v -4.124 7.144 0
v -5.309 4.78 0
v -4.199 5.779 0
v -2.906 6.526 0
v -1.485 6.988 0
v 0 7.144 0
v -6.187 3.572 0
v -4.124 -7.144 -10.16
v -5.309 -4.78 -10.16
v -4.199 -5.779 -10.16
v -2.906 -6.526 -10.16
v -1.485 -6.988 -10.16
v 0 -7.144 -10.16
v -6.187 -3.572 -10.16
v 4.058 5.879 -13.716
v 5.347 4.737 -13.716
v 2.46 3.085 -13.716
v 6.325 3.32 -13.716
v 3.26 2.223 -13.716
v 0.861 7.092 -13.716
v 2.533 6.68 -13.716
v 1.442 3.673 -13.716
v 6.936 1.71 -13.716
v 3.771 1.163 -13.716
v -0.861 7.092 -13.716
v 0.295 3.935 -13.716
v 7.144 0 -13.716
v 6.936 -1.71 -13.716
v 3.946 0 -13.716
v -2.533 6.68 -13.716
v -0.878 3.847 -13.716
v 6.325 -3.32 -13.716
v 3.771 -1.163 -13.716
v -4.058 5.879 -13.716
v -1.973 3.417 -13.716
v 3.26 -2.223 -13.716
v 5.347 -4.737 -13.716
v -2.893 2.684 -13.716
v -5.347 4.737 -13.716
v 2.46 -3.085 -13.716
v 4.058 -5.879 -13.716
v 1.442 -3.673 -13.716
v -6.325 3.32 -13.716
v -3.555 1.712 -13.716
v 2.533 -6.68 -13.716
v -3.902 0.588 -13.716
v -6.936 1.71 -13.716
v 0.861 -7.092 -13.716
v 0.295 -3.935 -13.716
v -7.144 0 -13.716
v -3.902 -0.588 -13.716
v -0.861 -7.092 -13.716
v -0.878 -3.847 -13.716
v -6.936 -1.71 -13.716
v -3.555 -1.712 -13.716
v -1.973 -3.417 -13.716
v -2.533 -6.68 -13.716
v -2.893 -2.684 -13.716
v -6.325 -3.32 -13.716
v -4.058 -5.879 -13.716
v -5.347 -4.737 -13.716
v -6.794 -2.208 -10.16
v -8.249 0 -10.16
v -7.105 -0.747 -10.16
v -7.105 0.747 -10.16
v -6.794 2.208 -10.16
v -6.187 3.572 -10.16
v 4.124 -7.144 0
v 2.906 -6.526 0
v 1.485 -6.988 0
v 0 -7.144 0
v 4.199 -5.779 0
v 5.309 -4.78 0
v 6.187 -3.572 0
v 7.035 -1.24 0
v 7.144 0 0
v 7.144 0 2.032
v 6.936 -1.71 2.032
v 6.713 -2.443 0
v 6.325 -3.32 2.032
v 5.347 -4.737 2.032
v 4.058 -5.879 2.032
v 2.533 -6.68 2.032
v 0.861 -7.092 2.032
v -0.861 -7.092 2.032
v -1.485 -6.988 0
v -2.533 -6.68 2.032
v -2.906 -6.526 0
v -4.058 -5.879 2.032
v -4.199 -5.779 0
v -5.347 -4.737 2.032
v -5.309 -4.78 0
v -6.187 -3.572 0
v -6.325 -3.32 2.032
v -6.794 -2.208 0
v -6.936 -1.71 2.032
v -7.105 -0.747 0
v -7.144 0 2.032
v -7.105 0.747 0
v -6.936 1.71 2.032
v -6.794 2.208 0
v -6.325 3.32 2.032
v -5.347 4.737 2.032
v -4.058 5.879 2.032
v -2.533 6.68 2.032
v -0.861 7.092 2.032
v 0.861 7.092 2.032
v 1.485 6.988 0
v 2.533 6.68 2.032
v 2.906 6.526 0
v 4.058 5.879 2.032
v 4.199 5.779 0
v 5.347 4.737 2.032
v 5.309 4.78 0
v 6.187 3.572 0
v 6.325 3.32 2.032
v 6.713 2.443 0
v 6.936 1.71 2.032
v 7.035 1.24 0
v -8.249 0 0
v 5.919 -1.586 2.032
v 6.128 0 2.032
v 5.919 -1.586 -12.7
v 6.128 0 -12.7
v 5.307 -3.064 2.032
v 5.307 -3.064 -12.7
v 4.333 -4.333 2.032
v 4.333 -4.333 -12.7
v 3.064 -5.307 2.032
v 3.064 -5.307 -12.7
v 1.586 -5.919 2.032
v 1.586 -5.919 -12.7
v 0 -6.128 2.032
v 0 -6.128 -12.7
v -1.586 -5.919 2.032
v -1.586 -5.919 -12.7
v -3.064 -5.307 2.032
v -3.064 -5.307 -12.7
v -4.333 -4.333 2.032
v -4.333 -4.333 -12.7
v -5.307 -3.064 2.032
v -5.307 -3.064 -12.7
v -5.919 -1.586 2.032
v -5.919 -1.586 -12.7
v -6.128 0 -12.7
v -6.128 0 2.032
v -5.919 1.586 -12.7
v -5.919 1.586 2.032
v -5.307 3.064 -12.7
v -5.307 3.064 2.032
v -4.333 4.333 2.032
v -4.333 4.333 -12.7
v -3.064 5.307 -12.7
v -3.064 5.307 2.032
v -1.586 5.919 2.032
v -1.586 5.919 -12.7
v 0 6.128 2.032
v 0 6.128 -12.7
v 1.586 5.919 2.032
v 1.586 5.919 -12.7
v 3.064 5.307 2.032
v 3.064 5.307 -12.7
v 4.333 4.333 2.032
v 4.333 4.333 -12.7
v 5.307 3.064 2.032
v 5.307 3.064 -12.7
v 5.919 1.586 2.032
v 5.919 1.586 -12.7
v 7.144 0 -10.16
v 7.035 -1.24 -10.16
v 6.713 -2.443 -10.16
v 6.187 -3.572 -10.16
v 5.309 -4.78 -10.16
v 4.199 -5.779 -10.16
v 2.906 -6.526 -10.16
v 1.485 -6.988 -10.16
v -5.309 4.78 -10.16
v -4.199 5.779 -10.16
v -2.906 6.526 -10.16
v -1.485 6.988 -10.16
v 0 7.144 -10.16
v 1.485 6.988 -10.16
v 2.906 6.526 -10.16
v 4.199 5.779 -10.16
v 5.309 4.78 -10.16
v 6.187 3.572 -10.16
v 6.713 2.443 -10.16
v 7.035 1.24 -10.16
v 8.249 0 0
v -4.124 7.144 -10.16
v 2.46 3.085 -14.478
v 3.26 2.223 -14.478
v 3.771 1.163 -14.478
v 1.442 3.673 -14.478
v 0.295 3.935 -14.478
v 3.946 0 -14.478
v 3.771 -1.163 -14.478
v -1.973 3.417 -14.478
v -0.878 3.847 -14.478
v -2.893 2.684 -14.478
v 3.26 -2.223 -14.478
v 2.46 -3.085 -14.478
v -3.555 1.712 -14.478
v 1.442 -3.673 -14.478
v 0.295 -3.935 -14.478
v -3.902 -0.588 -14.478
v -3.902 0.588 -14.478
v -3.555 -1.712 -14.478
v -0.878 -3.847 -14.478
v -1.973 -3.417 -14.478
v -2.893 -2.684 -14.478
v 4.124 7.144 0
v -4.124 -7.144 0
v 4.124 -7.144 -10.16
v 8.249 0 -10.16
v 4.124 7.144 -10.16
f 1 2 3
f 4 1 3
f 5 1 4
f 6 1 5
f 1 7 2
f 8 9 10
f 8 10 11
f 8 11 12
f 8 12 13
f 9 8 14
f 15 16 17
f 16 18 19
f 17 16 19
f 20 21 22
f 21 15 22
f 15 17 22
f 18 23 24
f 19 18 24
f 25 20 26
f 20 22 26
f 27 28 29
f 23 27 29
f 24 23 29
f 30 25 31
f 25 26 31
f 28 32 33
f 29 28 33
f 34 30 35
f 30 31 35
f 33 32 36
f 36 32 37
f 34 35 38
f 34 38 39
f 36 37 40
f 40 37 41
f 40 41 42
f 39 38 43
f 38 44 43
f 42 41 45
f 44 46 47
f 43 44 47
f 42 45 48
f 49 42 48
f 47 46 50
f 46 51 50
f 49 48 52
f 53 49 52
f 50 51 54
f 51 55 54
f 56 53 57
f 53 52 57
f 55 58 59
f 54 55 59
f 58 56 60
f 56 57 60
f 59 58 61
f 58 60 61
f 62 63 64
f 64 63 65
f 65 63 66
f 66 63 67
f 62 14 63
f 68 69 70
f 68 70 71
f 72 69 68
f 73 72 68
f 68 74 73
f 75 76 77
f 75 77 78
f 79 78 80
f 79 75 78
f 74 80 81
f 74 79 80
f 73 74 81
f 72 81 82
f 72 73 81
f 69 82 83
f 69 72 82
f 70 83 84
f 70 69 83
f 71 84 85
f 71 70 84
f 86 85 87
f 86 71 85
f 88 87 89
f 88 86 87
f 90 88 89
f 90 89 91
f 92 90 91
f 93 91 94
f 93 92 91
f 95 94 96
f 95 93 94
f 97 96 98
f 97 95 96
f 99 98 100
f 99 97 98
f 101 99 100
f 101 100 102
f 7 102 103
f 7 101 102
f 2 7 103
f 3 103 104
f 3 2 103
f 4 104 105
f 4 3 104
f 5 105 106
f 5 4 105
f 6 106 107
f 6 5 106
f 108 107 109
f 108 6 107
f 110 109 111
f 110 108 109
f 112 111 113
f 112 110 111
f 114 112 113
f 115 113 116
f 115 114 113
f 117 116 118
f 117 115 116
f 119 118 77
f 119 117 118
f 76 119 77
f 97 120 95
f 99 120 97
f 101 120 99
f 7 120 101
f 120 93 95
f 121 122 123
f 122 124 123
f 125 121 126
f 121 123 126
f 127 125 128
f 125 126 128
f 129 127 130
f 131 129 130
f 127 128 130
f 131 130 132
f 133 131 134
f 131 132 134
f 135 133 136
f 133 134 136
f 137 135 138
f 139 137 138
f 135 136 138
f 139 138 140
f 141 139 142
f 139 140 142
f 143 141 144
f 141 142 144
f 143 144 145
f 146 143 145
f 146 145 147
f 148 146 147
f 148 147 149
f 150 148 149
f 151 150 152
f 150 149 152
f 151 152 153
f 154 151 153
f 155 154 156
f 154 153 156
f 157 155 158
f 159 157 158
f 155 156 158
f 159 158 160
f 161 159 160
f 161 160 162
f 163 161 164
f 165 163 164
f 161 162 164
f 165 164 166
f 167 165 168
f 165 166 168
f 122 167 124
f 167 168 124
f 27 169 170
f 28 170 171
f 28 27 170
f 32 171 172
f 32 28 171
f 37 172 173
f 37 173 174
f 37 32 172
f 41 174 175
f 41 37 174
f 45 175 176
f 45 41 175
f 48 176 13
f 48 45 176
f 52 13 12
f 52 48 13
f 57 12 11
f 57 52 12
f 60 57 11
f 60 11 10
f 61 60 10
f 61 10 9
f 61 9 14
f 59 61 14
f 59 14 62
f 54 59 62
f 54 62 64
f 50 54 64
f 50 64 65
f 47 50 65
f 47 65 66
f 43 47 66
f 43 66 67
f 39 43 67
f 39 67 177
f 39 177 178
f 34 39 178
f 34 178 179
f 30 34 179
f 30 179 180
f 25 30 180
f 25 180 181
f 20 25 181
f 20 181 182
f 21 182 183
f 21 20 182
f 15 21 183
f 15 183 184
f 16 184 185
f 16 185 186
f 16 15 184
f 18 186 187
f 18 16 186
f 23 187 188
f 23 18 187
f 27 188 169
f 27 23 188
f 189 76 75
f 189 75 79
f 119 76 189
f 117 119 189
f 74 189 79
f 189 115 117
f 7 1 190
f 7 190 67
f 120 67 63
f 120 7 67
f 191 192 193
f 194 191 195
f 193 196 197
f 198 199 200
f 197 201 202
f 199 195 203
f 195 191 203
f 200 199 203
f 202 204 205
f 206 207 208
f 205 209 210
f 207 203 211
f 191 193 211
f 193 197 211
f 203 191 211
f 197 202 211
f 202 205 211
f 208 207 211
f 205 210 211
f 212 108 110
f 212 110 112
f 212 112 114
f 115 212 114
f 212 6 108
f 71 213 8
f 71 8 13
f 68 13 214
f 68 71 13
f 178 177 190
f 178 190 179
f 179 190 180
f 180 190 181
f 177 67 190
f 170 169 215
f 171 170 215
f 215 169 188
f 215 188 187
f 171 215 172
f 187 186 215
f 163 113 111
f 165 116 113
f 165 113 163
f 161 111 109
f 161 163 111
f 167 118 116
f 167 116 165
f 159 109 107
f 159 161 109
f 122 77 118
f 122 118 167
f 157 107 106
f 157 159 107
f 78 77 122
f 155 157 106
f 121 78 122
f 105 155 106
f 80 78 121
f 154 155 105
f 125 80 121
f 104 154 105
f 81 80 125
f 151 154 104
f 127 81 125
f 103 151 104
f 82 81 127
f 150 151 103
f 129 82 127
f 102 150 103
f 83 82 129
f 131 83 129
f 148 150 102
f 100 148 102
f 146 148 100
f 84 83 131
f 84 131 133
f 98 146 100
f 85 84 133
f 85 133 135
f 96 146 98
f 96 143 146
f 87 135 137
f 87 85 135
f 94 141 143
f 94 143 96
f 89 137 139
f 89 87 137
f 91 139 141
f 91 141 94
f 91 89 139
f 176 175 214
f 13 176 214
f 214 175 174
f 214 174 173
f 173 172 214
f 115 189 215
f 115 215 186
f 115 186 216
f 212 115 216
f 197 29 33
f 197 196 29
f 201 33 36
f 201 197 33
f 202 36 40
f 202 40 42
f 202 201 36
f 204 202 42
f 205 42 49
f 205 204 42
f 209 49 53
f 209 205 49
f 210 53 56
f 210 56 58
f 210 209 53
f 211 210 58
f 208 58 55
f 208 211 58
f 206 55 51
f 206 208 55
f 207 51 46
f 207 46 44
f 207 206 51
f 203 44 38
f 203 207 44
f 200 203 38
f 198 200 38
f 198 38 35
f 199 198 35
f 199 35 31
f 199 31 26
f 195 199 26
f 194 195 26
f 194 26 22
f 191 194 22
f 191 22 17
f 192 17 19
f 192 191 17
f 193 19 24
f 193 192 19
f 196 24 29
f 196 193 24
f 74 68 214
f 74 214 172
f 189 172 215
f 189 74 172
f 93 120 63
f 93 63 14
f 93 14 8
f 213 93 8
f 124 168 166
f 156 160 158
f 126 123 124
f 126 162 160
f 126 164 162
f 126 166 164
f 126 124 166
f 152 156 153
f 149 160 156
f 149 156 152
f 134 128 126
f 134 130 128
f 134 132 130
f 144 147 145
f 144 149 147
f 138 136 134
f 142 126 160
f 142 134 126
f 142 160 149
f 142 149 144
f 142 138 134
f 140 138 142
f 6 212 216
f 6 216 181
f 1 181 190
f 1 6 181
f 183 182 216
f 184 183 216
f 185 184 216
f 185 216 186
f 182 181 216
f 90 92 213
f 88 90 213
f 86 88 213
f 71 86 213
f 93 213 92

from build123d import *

# Parameters (mm, degrees)
SKETCH1_W           = 1.016
SKETCH1_H           = 14.732
SKETCH1_W_2         = 7.14375
SKETCH1_H_2         = 1.016
SKETCH1_W_3         = 3.945946328
SKETCH1_H_3         = 0.762
SKETCH2_R           = 6.12775
BOSS_EXTRUDE1_DEPTH = 10.16


with BuildPart() as part:
    # Sketch1 → Revolve1 (revolve)
    with BuildSketch(Plane(origin=(0, 0, 0), x_dir=(1, 0, 0), z_dir=(0, 1, 0))):
        with Locations((6.63575, 5.334)):
            Rectangle(SKETCH1_W, SKETCH1_H)
        with Locations((3.571875, 13.208)):
            Rectangle(SKETCH1_W_2, SKETCH1_H_2)
        with Locations((1.972973164, 14.097)):
            Rectangle(SKETCH1_W_3, SKETCH1_H_3)
    revolve(axis=Axis((0, 0, 288.756429932), (0, 0, -1)))

    # Sketch2 → Boss-Extrude1 (add)
    with BuildSketch(Plane.XY):
        Polygon((8.248891971, 0), (4.124445986, 7.14375), (-4.124445986, 7.14375), (-8.248891971, 0), (-4.124445986, -7.14375), (4.124445986, -7.14375), align=None)
        Circle(SKETCH2_R, mode=Mode.SUBTRACT)
    extrude(amount=-BOSS_EXTRUDE1_DEPTH)


solid = part.part
